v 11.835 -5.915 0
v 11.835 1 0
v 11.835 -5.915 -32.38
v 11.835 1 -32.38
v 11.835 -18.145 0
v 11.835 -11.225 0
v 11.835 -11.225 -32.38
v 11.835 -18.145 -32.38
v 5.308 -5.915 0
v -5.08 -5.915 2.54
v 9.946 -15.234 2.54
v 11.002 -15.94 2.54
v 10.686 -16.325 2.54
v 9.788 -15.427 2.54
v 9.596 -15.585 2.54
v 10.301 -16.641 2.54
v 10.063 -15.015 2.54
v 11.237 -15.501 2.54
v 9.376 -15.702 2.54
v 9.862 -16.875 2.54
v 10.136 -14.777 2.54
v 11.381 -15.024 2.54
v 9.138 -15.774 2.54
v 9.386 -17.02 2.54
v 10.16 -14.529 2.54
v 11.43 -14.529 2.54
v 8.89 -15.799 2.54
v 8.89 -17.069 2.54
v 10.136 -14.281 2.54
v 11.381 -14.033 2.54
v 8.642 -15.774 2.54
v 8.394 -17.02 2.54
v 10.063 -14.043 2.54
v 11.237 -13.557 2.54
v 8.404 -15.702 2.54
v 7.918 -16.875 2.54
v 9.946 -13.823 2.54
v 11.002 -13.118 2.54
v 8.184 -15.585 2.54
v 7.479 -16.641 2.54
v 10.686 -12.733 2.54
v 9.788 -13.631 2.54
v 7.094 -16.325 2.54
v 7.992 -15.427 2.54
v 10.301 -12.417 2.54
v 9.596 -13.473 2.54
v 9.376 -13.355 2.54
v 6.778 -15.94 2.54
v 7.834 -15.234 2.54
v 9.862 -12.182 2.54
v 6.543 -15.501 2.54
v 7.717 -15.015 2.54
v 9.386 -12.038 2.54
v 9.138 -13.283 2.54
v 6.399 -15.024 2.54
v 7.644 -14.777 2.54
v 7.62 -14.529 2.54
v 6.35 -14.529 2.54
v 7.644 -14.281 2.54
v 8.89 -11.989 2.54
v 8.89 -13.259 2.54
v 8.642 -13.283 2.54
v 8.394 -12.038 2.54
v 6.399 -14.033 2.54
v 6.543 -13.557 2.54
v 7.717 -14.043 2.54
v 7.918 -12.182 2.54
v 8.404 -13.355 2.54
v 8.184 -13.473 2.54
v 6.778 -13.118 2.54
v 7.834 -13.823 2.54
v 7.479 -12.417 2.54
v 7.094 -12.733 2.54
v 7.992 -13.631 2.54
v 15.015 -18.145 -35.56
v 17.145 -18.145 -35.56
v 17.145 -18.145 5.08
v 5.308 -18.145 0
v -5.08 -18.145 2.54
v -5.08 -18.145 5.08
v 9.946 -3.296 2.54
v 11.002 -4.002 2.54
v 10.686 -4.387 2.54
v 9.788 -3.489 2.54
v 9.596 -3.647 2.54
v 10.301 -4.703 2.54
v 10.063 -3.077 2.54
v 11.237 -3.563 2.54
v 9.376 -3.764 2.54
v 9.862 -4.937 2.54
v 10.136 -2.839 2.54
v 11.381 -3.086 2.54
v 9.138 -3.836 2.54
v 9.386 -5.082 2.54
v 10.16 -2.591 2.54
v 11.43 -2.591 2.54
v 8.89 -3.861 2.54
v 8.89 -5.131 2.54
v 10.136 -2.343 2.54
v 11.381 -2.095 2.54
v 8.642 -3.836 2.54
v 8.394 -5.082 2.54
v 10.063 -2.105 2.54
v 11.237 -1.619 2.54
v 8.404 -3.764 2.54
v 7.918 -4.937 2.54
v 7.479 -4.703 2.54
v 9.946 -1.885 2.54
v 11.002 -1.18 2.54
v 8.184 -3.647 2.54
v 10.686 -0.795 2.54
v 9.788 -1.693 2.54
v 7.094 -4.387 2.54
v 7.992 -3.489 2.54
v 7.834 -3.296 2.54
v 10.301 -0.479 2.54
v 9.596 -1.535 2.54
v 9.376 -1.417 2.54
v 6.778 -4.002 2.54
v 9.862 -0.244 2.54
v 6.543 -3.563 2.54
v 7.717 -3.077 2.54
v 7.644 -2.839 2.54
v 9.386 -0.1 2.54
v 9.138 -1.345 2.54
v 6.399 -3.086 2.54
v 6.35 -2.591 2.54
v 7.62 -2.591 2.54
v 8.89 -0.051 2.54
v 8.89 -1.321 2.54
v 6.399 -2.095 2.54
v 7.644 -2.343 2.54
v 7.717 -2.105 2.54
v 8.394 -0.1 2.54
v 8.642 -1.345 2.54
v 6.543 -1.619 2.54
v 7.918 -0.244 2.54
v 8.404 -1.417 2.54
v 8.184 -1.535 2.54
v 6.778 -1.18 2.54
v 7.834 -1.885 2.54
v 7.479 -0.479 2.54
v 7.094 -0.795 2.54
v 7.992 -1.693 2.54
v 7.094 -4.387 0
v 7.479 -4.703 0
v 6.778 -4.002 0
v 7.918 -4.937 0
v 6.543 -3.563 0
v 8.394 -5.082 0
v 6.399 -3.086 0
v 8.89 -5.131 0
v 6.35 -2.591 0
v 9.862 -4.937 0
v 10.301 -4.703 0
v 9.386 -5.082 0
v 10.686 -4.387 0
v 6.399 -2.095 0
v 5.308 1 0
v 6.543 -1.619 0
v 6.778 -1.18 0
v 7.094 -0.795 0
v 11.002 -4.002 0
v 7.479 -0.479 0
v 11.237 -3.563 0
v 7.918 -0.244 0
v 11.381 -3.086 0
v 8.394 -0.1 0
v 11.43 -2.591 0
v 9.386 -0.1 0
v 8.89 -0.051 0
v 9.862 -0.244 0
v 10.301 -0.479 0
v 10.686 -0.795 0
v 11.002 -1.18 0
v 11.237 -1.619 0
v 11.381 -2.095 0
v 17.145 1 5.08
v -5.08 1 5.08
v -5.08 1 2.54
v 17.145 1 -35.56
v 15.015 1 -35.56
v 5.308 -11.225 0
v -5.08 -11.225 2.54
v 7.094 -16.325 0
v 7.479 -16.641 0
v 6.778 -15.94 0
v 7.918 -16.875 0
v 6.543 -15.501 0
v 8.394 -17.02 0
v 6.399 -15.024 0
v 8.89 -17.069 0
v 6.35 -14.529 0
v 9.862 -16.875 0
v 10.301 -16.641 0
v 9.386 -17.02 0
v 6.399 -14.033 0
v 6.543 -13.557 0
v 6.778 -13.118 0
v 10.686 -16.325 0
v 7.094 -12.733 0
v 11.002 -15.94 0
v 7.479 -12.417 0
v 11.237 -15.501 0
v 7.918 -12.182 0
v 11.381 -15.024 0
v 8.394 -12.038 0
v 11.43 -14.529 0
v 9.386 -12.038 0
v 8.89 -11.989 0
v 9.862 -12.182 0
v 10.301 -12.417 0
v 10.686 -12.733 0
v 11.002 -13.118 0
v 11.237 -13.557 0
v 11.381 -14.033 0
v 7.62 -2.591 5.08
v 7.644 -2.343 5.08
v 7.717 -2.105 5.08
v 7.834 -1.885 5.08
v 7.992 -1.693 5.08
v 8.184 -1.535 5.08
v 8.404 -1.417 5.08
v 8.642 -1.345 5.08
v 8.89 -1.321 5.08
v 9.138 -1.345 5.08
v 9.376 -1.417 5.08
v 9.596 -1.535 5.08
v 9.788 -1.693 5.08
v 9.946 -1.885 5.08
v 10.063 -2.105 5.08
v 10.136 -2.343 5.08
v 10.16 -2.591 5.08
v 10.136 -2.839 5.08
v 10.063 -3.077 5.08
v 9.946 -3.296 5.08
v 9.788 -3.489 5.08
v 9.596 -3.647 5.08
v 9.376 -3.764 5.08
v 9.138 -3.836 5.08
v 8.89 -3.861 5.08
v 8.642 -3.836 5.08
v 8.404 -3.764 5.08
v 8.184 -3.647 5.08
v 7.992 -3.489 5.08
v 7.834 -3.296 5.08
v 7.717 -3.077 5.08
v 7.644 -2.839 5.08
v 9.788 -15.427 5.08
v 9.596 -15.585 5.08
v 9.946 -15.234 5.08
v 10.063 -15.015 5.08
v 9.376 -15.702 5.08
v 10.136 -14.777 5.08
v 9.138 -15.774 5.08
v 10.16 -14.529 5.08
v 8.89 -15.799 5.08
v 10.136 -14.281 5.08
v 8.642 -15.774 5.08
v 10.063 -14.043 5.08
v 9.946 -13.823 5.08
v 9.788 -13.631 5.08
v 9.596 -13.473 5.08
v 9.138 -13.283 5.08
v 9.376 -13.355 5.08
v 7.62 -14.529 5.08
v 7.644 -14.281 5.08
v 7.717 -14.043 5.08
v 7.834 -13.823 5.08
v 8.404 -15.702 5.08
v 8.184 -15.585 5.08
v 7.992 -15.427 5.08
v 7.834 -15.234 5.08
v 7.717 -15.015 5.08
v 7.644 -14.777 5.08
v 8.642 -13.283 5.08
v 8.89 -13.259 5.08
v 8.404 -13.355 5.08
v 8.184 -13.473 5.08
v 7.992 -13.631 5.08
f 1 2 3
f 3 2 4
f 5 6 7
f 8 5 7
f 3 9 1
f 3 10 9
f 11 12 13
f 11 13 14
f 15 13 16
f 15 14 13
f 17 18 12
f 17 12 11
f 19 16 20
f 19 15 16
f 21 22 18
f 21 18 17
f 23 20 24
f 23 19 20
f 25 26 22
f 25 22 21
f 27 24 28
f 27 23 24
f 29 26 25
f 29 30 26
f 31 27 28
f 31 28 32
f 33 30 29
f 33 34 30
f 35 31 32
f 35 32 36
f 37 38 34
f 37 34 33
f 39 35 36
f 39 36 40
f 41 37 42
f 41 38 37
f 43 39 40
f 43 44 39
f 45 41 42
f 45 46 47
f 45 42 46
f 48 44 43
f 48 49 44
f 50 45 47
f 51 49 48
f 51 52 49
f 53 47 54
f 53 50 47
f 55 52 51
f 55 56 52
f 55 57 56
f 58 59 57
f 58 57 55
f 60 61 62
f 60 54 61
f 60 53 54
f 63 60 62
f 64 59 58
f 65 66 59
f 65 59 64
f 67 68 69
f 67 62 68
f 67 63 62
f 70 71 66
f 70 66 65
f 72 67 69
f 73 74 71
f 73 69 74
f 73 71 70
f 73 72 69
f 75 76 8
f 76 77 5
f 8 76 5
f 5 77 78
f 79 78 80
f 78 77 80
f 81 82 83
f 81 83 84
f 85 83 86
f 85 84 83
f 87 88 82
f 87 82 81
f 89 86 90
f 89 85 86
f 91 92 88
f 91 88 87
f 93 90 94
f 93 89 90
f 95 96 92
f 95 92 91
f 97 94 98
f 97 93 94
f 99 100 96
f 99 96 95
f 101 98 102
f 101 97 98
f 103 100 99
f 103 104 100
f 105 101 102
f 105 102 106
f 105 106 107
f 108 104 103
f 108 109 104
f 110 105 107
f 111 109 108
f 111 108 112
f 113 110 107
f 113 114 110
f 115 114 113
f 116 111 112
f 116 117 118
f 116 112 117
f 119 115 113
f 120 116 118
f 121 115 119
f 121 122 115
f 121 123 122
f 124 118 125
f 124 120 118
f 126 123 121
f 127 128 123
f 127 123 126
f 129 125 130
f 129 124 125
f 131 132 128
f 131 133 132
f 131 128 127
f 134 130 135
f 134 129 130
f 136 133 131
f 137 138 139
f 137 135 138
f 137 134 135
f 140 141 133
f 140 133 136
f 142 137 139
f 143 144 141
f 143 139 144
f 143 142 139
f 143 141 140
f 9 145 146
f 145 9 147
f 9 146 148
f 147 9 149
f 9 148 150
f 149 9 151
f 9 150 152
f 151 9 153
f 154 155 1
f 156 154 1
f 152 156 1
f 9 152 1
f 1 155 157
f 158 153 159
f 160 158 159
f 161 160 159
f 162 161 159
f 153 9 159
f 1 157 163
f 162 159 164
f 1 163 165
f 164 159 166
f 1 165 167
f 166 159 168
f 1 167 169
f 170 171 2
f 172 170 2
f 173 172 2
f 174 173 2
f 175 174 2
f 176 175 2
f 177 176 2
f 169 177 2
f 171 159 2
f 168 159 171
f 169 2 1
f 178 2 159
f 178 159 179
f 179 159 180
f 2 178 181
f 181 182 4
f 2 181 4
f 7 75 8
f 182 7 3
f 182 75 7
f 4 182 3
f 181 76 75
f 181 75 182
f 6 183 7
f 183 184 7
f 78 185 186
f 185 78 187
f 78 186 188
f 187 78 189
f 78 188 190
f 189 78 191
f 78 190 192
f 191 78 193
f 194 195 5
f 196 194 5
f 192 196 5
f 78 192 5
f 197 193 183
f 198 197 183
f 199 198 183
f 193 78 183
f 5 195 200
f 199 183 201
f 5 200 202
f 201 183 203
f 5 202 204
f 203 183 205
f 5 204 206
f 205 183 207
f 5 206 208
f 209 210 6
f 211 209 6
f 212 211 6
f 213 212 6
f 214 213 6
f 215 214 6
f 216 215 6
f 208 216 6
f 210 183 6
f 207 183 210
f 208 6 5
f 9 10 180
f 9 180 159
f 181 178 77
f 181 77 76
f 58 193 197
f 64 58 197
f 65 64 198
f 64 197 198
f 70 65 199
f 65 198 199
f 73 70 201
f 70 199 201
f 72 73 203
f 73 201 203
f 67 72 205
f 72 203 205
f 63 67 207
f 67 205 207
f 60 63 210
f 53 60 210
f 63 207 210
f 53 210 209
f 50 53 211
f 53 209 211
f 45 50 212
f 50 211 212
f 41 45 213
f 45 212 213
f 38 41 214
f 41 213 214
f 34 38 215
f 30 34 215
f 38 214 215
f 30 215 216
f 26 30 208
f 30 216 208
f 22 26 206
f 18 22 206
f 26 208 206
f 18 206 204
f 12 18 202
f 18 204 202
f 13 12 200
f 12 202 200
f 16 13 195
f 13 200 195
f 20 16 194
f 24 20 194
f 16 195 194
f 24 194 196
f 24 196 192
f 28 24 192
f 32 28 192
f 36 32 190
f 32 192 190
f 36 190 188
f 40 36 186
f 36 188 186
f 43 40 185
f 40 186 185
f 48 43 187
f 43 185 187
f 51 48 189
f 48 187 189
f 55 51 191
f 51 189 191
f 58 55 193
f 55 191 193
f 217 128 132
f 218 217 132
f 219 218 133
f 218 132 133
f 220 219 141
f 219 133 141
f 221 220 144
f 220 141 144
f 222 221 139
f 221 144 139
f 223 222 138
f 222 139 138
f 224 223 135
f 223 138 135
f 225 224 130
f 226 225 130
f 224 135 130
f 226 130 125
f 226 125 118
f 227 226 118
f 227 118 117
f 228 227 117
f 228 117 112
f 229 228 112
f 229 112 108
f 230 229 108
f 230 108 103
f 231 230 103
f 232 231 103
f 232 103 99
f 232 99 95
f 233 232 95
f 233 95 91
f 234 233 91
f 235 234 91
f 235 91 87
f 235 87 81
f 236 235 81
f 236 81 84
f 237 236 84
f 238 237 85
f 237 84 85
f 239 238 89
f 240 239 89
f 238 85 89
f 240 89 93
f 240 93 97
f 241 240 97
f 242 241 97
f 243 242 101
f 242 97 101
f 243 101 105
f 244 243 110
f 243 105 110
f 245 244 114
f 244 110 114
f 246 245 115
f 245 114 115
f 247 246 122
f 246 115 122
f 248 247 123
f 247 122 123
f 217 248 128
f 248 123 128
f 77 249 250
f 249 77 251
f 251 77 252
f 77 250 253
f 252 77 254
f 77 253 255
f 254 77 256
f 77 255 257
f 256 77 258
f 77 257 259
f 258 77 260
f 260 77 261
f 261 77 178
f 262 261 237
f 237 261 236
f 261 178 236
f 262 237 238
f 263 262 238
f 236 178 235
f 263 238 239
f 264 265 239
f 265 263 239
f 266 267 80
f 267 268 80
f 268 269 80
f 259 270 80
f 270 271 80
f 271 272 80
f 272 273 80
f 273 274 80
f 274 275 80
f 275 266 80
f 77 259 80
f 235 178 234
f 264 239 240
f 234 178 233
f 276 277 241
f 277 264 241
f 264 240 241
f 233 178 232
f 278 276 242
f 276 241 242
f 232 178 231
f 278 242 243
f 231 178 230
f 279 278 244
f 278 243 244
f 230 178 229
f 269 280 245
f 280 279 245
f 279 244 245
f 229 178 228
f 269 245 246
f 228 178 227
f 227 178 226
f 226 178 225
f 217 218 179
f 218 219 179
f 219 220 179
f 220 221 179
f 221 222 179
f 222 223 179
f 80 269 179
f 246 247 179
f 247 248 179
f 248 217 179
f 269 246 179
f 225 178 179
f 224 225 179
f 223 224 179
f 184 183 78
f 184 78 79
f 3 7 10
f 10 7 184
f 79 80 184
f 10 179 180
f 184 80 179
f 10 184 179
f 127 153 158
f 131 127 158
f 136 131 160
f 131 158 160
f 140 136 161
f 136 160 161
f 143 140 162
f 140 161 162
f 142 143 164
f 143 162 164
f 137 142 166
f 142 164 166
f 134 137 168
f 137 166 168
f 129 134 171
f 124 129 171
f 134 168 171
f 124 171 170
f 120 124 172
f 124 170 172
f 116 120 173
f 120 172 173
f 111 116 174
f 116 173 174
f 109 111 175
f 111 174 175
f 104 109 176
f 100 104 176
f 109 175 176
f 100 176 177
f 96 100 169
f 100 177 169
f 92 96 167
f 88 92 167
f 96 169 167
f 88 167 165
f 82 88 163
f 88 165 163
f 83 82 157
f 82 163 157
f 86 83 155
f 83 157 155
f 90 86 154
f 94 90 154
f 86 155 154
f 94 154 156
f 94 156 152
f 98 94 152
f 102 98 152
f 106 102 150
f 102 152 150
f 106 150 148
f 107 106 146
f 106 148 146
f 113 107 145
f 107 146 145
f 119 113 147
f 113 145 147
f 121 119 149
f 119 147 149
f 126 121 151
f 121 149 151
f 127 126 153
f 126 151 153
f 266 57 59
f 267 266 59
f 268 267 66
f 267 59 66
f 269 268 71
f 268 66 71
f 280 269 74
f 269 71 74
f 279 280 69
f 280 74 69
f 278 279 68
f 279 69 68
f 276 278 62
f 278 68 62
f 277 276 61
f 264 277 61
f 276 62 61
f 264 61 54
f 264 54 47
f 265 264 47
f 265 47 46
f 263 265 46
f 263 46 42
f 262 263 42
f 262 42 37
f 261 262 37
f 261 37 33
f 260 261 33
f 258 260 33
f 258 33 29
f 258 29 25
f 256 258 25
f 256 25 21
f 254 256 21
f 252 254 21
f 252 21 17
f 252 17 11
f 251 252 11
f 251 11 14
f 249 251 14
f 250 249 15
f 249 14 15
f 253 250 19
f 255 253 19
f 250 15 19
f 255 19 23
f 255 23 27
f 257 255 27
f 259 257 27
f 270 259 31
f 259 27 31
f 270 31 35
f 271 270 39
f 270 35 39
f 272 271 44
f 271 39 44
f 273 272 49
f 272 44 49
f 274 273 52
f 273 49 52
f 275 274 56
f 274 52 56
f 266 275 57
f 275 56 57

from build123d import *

# Parameters (mm, degrees)
SKETCH1_W           = 17.145
SKETCH1_H           = 17.145
BOSS_EXTRUDE1_DEPTH = 5.08
SKETCH2_R           = 1.27
CUT_EXTRUDE1_DEPTH  = 25.773139688
SKETCH3_R           = 2.54
CUT_EXTRUDE4_DEPTH  = 2.54
SKETCH4_W           = 6.307704678
SKETCH4_H           = 17.145
BOSS_EXTRUDE2_DEPTH = 17.78
SKETCH5_W           = 2.54
SKETCH5_H           = 17.145
BOSS_EXTRUDE3_DEPTH = 5.08
CHAMFER1_SIZE       = 3.175
BOSS_EXTRUDE4_DEPTH = 2.54
BOSS_EXTRUDE5_DEPTH = 2.54
SKETCH9_W           = 1
SKETCH9_H           = 17.145
CUT_EXTRUDE5_DEPTH  = 17.78
EXTRUDE_1_DEPTH     = 1
EXTRUDE_2_DEPTH     = 1
EXTRUDE_3_DEPTH     = 5.31
CUT_EXTRUDE_1_DEPTH = 44.874772364
CUT_EXTRUDE_2_DEPTH = 44.874772364
EXTRUDE_4_DEPTH     = 2.655
EXTRUDE_5_DEPTH     = 6.915
EXTRUDE_6_DEPTH     = 6.92


with BuildPart() as part:
    # Sketch1 → Boss-Extrude1 (new body)
    with BuildSketch(Plane.XY):
        with Locations((8.5725, -8.5725)):
            Rectangle(SKETCH1_W, SKETCH1_H)
    extrude(amount=BOSS_EXTRUDE1_DEPTH)

    # Sketch2 → Cut-Extrude1 (cut, through all)
    with BuildSketch(Plane(origin=(0, 0, 0), x_dir=(-1, 0, 0), z_dir=(0, 0, -1))):
        with Locations((-8.89, -2.5908)):
            Circle(SKETCH2_R)
        with Locations((-8.89, -14.5288)):
            Circle(SKETCH2_R)
    extrude(amount=-CUT_EXTRUDE1_DEPTH, mode=Mode.SUBTRACT)

    # Sketch3 → Cut-Extrude4 (cut)
    with BuildSketch(Plane(origin=(0, 0, 0), x_dir=(-1, 0, 0), z_dir=(0, 0, -1))):
        with Locations((-8.89, -2.5908)):
            Circle(SKETCH3_R)
        with Locations((-8.89, -14.5288)):
            Circle(SKETCH3_R)
    extrude(amount=-CUT_EXTRUDE4_DEPTH, mode=Mode.SUBTRACT)

    # Sketch4 → Boss-Extrude2 (add)
    with BuildSketch(Plane(origin=(0, 0, 0), x_dir=(-1, 0, 0), z_dir=(0, 0, -1))):
        with Locations((-3.153852339, -8.5725)):
            Rectangle(SKETCH4_W, SKETCH4_H)
    extrude(amount=BOSS_EXTRUDE2_DEPTH)

    # Sketch5 → Boss-Extrude3 (add)
    with BuildSketch(Plane.ZY):
        with Locations((3.81, -8.5725)):
            Rectangle(SKETCH5_W, SKETCH5_H)
    extrude(amount=BOSS_EXTRUDE3_DEPTH)

    # Chamfer1
    chamfer1_edges = [part.edges().sort_by_distance(p)[0] for p in [
        (0, -8.5725, -17.78),
    ]]
    chamfer(chamfer1_edges, length=CHAMFER1_SIZE)

    # Sketch7 → Boss-Extrude4 (add)
    with BuildSketch(Plane(origin=(0, 0, 0), x_dir=(1, 0, 0), z_dir=(0, 1, 0))):
        Polygon((-5.08, -2.54), (0, 14.605), (0, -2.54), align=None)
    extrude(amount=-BOSS_EXTRUDE4_DEPTH)

    # Sketch8 → Boss-Extrude5 (add)
    with BuildSketch(Plane.XZ.offset(17.145)):
        Polygon((0, 2.54), (-5.08, 2.54), (0, -14.605), align=None)
    extrude(amount=-BOSS_EXTRUDE5_DEPTH)

    # Sketch9 → Cut-Extrude5 (cut)
    with BuildSketch(Plane(origin=(0, 0, -17.78), x_dir=(-1, 0, 0), z_dir=(0, 0, -1))):
        with Locations((-5.807704678, -8.5725)):
            Rectangle(SKETCH9_W, SKETCH9_H)
    extrude(amount=-CUT_EXTRUDE5_DEPTH, mode=Mode.SUBTRACT)

    # 草图1 → 凸台-拉伸1 (add)
    with BuildSketch(Plane(origin=(0, 0, 0), x_dir=(1, 0, 0), z_dir=(0, 1, 0))):
        Polygon((17.145, 0), (5.307704678, 0), (5.307704678, 17.78), (3.175, 17.78), (0, 14.605), (-5.08, -2.54), (-5.08, -5.08), (17.145, -5.08), align=None)
    extrude(amount=EXTRUDE_1_DEPTH)

    # 草图2 → 凸台-拉伸2 (add)
    with BuildSketch(Plane.XZ.offset(17.145)):
        Polygon((5.307704678, -17.78), (5.307704678, 0), (17.145, 0), (17.145, 5.08), (-5.08, 5.08), (-5.08, 2.54), (0, -14.605), (3.175, -17.78), align=None)
    extrude(amount=EXTRUDE_2_DEPTH)

    # 草图3 → 凸台-拉伸3 (add)
    with BuildSketch(Plane(origin=(17.145, 0, 0), x_dir=(0, 0, -1), z_dir=(1, 0, 0))):
        Polygon((17.78, -18.145), (35.56, -18.145), (35.56, 1), (17.78, 1), (0, 1), (0, -18.145), align=None)
    extrude(amount=-EXTRUDE_3_DEPTH)

    # 草图4 → 切除-拉伸1 (cut, through all)
    with BuildSketch(Plane(origin=(0, 1, 0), x_dir=(1, 0, 0), z_dir=(0, 1, 0))):
        Polygon((15.015, 35.56), (11.835, 32.38), (11.835, 35.56), align=None)
    extrude(amount=-CUT_EXTRUDE_1_DEPTH, mode=Mode.SUBTRACT)

    # 草图5 → 切除-拉伸2 (cut, through all)
    with BuildSketch(Plane(origin=(0, 1, 0), x_dir=(1, 0, 0), z_dir=(0, 1, 0))):
        Polygon((0, 14.605), (-5.08, -2.54), (5.307704678, -2.54), (5.307704678, 0), (5.307704678, 17.78), (3.175, 17.78), align=None)
    extrude(amount=-CUT_EXTRUDE_2_DEPTH, mode=Mode.SUBTRACT)

    # 草图6 → 凸台-拉伸4 (add, symmetric)
    with BuildSketch(Plane(origin=(0, -8.57, 0), x_dir=(-1, 0, 0), z_dir=(0, -1, 0))):
        Polygon((-11.835, 0), (-11.835, 32.38), (5.08, -2.54), (-5.307704678, -2.54), (-5.307704678, 0), align=None)
    extrude(amount=EXTRUDE_4_DEPTH, both=True)

    # 草图7 → 凸台-拉伸5 (add)
    with BuildSketch(Plane(origin=(0, -5.915, 0), x_dir=(1, 0, 0), z_dir=(0, 1, 0))):
        Polygon((5.307704678, -2.54), (-5.08, -2.54), (5.307704678, 0), align=None)
    extrude(amount=EXTRUDE_5_DEPTH)

    # 草图8 → 凸台-拉伸6 (add)
    with BuildSketch(Plane.XZ.offset(11.225)):
        Polygon((-5.08, 2.54), (5.307704678, 2.54), (5.307704678, 0), align=None)
    extrude(amount=EXTRUDE_6_DEPTH)


solid = part.part
